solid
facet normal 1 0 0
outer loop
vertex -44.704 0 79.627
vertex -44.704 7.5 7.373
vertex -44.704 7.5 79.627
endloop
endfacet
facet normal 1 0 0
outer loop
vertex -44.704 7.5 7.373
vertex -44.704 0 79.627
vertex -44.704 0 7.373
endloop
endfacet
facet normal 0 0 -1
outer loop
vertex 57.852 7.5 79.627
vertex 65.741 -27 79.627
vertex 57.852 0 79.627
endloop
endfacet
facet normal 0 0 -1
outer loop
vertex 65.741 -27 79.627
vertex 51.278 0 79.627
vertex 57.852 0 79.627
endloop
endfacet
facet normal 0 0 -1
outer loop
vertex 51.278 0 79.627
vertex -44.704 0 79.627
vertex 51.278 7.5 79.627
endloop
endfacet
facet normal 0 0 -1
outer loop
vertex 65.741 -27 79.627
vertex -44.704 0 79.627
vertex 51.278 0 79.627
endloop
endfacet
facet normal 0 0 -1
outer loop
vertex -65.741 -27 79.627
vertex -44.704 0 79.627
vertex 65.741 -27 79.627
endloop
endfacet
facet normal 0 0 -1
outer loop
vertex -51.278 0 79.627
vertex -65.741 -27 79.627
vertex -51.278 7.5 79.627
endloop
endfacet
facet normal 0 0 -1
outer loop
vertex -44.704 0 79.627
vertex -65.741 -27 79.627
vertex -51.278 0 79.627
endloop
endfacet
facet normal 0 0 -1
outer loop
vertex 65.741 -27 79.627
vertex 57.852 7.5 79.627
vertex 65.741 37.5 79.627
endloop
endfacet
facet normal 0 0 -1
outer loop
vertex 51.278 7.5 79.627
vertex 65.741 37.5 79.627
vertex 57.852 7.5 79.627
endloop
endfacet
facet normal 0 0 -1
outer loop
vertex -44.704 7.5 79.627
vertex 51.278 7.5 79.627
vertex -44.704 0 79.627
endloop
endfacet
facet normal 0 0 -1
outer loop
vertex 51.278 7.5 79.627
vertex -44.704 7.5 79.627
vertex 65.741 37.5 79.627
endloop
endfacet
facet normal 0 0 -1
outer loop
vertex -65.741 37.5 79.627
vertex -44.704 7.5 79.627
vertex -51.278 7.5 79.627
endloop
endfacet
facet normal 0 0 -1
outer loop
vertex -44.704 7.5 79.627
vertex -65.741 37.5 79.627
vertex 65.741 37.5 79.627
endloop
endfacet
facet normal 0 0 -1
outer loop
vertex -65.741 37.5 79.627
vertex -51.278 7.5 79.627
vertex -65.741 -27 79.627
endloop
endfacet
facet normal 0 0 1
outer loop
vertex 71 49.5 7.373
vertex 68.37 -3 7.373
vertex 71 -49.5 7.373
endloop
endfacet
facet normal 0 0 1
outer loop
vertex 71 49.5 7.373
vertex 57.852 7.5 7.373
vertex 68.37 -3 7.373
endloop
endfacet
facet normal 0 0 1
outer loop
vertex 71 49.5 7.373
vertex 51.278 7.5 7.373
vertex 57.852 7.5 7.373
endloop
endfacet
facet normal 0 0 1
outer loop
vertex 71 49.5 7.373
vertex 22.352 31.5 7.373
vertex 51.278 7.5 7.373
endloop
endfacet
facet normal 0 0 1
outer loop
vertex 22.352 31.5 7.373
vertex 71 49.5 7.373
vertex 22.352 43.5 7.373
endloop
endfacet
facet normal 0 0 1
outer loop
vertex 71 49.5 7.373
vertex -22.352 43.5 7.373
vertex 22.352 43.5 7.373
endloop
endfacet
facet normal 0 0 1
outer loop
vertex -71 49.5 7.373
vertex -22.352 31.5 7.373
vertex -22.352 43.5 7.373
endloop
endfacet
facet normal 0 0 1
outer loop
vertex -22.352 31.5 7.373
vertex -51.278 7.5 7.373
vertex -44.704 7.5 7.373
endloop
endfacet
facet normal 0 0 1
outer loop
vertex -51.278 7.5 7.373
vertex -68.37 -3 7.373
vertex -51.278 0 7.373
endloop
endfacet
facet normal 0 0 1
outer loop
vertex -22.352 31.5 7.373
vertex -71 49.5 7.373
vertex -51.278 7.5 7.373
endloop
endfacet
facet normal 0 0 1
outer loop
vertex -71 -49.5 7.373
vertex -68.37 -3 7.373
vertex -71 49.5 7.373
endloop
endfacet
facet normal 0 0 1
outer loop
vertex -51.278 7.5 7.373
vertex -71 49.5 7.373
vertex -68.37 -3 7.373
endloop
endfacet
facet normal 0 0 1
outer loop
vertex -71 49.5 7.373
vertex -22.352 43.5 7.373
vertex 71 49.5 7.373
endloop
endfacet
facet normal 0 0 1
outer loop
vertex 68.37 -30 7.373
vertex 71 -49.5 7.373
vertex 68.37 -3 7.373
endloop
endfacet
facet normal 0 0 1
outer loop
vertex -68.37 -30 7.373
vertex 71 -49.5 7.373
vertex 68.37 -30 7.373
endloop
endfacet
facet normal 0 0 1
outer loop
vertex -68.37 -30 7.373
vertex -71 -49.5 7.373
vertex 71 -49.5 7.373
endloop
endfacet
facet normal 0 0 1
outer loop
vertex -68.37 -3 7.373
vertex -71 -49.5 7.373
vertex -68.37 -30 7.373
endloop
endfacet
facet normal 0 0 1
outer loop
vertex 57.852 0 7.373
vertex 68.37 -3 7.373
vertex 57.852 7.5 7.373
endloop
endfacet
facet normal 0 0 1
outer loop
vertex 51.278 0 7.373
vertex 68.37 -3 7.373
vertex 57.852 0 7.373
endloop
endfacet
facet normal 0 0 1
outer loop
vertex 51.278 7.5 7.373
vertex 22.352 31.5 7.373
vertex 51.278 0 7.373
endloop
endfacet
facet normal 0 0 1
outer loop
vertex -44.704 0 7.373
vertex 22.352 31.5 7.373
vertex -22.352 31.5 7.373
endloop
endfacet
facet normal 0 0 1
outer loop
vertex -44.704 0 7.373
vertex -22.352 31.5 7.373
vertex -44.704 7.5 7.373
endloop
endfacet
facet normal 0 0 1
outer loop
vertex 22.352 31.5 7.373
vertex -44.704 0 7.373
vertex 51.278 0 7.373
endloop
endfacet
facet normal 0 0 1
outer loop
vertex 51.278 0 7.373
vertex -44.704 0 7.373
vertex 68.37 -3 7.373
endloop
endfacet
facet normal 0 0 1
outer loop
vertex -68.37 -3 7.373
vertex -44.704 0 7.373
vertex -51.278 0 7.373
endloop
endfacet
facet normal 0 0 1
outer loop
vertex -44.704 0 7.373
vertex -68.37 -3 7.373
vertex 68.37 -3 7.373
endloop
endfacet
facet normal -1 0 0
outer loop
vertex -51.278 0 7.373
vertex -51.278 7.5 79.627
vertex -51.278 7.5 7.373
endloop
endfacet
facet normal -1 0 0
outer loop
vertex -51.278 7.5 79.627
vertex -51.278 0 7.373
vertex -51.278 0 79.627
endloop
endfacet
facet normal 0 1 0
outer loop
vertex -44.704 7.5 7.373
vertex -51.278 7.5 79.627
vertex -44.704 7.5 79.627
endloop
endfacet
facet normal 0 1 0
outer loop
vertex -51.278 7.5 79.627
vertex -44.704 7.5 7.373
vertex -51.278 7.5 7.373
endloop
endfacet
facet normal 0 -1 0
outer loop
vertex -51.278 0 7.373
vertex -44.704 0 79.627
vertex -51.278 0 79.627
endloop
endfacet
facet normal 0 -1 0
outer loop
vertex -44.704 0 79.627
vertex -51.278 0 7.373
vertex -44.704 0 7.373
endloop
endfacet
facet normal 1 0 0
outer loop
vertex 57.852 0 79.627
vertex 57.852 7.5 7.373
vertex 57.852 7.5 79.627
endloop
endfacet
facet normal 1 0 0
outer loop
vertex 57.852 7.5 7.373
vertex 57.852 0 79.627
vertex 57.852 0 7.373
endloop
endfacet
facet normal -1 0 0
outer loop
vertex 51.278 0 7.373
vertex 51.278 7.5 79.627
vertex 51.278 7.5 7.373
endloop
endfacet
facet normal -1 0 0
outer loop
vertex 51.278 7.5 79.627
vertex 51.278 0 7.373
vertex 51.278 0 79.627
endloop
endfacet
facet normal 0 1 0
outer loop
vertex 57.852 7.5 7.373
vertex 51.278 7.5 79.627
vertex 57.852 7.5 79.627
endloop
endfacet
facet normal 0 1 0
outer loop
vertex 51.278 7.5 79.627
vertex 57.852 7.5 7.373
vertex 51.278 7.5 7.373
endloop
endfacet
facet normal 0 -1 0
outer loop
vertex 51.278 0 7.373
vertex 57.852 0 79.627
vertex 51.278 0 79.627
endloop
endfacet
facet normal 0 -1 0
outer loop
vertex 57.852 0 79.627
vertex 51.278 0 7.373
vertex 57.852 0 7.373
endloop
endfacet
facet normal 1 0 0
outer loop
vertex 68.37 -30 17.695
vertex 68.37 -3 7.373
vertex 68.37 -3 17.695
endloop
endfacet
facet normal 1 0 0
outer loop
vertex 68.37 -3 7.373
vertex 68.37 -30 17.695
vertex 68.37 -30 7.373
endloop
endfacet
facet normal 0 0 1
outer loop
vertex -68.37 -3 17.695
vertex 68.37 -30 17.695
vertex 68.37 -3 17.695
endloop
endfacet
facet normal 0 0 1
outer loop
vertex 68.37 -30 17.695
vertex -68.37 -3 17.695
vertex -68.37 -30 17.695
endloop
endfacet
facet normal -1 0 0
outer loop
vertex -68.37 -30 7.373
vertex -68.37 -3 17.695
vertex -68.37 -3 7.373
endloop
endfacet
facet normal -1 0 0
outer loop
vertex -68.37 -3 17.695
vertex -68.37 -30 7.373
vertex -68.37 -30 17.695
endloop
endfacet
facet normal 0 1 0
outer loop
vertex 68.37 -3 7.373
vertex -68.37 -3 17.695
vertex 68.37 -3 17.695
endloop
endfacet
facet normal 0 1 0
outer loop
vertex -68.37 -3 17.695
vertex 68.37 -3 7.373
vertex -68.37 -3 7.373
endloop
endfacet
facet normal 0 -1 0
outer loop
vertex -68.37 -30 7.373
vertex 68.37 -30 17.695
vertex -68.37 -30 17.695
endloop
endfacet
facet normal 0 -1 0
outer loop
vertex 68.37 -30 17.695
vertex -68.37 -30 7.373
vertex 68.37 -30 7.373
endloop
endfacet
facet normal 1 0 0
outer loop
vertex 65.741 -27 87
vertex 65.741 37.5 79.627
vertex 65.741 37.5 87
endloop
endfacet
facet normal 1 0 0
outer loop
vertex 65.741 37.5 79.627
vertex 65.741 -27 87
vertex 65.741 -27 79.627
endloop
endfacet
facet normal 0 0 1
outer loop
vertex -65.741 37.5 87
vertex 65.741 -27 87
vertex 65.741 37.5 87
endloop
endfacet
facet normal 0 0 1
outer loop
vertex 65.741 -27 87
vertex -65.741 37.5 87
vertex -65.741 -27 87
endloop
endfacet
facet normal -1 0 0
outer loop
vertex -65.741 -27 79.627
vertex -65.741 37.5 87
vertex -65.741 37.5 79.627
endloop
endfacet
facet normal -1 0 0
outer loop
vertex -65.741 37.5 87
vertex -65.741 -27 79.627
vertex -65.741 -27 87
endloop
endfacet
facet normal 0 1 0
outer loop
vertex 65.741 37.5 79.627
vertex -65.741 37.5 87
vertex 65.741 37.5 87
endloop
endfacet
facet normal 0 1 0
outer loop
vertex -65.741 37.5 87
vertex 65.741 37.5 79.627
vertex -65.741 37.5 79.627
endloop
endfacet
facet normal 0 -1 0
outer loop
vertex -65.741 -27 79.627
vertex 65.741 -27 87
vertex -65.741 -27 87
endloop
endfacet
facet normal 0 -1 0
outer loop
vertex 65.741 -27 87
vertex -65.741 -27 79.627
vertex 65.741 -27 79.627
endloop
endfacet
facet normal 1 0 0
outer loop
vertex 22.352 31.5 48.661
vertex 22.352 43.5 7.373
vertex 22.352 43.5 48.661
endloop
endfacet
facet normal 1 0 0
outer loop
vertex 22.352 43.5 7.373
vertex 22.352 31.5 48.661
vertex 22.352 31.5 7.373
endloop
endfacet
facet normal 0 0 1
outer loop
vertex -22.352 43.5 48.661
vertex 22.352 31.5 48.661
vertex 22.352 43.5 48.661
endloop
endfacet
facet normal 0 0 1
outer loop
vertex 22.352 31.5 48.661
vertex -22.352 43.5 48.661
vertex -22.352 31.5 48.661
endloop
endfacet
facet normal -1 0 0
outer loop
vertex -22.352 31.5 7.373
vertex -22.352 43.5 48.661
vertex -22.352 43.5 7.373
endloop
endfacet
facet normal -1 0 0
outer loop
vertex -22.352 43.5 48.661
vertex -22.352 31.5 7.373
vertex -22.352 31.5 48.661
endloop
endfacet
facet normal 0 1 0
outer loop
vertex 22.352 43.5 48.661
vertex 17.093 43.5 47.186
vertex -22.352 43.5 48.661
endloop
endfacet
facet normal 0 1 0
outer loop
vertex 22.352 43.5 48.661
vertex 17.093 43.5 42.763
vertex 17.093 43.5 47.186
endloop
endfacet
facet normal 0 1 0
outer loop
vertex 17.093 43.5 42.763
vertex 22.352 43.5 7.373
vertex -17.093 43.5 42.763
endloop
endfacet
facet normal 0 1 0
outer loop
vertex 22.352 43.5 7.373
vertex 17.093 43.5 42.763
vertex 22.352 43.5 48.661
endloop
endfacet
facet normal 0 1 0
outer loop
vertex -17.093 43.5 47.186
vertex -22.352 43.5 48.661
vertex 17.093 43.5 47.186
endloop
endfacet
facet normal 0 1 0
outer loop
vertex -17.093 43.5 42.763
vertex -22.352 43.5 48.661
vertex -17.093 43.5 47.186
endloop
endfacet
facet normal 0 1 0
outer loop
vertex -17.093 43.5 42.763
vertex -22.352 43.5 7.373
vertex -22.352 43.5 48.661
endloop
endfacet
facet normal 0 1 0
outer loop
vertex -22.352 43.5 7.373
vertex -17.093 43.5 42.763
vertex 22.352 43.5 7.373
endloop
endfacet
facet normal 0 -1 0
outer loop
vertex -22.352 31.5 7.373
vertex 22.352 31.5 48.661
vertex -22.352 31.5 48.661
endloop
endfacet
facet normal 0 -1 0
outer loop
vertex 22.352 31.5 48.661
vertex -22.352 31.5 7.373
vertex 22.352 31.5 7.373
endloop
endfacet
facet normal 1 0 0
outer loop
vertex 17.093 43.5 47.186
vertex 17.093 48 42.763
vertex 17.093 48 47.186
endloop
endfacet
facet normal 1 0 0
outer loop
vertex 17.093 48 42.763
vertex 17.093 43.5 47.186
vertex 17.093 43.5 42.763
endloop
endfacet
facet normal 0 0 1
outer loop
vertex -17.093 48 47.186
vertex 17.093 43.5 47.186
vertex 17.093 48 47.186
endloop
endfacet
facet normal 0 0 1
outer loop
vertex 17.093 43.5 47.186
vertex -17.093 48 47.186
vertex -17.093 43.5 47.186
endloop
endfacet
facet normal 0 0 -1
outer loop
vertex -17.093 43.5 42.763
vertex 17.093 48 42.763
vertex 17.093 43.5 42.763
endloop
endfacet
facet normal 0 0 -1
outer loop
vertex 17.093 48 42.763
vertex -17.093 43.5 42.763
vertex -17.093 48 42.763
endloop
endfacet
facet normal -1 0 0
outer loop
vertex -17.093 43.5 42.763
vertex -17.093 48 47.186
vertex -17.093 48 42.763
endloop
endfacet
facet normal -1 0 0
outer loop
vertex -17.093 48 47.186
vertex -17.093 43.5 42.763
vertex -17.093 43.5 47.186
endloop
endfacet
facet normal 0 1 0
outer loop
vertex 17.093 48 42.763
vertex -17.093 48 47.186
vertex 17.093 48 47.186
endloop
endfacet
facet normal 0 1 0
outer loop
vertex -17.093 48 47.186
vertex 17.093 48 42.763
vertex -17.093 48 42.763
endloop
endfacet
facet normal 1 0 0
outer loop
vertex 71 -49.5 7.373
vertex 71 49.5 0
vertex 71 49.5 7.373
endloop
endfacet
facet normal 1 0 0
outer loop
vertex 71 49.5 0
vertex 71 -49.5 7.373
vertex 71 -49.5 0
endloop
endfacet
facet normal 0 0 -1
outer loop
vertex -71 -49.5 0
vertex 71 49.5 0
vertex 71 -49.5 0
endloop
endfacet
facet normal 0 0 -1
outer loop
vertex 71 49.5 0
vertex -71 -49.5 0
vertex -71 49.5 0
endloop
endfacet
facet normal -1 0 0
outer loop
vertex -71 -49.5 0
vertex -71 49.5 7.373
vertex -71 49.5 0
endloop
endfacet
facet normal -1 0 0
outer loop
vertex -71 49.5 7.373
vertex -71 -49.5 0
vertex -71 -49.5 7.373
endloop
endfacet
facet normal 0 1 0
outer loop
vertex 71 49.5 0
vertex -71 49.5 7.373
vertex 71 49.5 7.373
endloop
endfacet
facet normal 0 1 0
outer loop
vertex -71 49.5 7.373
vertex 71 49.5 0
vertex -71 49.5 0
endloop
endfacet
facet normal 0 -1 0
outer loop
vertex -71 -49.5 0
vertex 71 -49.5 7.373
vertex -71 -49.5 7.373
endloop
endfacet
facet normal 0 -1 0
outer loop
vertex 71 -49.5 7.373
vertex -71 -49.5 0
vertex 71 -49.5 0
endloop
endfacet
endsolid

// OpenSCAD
// Retro Station Platform | 复古站台微缩场景 | original parametric CAD prototype
// CAD uses millimeters/Z-up; target dimensions [width,depth,height] mm.
// Product hypothesis only; full slicer/manifold and real-print checks required.
use <lib/commerce_forms.scad>
resize([142,99,87],auto=false)
    commercial_form(family="scenery",variant=5);
